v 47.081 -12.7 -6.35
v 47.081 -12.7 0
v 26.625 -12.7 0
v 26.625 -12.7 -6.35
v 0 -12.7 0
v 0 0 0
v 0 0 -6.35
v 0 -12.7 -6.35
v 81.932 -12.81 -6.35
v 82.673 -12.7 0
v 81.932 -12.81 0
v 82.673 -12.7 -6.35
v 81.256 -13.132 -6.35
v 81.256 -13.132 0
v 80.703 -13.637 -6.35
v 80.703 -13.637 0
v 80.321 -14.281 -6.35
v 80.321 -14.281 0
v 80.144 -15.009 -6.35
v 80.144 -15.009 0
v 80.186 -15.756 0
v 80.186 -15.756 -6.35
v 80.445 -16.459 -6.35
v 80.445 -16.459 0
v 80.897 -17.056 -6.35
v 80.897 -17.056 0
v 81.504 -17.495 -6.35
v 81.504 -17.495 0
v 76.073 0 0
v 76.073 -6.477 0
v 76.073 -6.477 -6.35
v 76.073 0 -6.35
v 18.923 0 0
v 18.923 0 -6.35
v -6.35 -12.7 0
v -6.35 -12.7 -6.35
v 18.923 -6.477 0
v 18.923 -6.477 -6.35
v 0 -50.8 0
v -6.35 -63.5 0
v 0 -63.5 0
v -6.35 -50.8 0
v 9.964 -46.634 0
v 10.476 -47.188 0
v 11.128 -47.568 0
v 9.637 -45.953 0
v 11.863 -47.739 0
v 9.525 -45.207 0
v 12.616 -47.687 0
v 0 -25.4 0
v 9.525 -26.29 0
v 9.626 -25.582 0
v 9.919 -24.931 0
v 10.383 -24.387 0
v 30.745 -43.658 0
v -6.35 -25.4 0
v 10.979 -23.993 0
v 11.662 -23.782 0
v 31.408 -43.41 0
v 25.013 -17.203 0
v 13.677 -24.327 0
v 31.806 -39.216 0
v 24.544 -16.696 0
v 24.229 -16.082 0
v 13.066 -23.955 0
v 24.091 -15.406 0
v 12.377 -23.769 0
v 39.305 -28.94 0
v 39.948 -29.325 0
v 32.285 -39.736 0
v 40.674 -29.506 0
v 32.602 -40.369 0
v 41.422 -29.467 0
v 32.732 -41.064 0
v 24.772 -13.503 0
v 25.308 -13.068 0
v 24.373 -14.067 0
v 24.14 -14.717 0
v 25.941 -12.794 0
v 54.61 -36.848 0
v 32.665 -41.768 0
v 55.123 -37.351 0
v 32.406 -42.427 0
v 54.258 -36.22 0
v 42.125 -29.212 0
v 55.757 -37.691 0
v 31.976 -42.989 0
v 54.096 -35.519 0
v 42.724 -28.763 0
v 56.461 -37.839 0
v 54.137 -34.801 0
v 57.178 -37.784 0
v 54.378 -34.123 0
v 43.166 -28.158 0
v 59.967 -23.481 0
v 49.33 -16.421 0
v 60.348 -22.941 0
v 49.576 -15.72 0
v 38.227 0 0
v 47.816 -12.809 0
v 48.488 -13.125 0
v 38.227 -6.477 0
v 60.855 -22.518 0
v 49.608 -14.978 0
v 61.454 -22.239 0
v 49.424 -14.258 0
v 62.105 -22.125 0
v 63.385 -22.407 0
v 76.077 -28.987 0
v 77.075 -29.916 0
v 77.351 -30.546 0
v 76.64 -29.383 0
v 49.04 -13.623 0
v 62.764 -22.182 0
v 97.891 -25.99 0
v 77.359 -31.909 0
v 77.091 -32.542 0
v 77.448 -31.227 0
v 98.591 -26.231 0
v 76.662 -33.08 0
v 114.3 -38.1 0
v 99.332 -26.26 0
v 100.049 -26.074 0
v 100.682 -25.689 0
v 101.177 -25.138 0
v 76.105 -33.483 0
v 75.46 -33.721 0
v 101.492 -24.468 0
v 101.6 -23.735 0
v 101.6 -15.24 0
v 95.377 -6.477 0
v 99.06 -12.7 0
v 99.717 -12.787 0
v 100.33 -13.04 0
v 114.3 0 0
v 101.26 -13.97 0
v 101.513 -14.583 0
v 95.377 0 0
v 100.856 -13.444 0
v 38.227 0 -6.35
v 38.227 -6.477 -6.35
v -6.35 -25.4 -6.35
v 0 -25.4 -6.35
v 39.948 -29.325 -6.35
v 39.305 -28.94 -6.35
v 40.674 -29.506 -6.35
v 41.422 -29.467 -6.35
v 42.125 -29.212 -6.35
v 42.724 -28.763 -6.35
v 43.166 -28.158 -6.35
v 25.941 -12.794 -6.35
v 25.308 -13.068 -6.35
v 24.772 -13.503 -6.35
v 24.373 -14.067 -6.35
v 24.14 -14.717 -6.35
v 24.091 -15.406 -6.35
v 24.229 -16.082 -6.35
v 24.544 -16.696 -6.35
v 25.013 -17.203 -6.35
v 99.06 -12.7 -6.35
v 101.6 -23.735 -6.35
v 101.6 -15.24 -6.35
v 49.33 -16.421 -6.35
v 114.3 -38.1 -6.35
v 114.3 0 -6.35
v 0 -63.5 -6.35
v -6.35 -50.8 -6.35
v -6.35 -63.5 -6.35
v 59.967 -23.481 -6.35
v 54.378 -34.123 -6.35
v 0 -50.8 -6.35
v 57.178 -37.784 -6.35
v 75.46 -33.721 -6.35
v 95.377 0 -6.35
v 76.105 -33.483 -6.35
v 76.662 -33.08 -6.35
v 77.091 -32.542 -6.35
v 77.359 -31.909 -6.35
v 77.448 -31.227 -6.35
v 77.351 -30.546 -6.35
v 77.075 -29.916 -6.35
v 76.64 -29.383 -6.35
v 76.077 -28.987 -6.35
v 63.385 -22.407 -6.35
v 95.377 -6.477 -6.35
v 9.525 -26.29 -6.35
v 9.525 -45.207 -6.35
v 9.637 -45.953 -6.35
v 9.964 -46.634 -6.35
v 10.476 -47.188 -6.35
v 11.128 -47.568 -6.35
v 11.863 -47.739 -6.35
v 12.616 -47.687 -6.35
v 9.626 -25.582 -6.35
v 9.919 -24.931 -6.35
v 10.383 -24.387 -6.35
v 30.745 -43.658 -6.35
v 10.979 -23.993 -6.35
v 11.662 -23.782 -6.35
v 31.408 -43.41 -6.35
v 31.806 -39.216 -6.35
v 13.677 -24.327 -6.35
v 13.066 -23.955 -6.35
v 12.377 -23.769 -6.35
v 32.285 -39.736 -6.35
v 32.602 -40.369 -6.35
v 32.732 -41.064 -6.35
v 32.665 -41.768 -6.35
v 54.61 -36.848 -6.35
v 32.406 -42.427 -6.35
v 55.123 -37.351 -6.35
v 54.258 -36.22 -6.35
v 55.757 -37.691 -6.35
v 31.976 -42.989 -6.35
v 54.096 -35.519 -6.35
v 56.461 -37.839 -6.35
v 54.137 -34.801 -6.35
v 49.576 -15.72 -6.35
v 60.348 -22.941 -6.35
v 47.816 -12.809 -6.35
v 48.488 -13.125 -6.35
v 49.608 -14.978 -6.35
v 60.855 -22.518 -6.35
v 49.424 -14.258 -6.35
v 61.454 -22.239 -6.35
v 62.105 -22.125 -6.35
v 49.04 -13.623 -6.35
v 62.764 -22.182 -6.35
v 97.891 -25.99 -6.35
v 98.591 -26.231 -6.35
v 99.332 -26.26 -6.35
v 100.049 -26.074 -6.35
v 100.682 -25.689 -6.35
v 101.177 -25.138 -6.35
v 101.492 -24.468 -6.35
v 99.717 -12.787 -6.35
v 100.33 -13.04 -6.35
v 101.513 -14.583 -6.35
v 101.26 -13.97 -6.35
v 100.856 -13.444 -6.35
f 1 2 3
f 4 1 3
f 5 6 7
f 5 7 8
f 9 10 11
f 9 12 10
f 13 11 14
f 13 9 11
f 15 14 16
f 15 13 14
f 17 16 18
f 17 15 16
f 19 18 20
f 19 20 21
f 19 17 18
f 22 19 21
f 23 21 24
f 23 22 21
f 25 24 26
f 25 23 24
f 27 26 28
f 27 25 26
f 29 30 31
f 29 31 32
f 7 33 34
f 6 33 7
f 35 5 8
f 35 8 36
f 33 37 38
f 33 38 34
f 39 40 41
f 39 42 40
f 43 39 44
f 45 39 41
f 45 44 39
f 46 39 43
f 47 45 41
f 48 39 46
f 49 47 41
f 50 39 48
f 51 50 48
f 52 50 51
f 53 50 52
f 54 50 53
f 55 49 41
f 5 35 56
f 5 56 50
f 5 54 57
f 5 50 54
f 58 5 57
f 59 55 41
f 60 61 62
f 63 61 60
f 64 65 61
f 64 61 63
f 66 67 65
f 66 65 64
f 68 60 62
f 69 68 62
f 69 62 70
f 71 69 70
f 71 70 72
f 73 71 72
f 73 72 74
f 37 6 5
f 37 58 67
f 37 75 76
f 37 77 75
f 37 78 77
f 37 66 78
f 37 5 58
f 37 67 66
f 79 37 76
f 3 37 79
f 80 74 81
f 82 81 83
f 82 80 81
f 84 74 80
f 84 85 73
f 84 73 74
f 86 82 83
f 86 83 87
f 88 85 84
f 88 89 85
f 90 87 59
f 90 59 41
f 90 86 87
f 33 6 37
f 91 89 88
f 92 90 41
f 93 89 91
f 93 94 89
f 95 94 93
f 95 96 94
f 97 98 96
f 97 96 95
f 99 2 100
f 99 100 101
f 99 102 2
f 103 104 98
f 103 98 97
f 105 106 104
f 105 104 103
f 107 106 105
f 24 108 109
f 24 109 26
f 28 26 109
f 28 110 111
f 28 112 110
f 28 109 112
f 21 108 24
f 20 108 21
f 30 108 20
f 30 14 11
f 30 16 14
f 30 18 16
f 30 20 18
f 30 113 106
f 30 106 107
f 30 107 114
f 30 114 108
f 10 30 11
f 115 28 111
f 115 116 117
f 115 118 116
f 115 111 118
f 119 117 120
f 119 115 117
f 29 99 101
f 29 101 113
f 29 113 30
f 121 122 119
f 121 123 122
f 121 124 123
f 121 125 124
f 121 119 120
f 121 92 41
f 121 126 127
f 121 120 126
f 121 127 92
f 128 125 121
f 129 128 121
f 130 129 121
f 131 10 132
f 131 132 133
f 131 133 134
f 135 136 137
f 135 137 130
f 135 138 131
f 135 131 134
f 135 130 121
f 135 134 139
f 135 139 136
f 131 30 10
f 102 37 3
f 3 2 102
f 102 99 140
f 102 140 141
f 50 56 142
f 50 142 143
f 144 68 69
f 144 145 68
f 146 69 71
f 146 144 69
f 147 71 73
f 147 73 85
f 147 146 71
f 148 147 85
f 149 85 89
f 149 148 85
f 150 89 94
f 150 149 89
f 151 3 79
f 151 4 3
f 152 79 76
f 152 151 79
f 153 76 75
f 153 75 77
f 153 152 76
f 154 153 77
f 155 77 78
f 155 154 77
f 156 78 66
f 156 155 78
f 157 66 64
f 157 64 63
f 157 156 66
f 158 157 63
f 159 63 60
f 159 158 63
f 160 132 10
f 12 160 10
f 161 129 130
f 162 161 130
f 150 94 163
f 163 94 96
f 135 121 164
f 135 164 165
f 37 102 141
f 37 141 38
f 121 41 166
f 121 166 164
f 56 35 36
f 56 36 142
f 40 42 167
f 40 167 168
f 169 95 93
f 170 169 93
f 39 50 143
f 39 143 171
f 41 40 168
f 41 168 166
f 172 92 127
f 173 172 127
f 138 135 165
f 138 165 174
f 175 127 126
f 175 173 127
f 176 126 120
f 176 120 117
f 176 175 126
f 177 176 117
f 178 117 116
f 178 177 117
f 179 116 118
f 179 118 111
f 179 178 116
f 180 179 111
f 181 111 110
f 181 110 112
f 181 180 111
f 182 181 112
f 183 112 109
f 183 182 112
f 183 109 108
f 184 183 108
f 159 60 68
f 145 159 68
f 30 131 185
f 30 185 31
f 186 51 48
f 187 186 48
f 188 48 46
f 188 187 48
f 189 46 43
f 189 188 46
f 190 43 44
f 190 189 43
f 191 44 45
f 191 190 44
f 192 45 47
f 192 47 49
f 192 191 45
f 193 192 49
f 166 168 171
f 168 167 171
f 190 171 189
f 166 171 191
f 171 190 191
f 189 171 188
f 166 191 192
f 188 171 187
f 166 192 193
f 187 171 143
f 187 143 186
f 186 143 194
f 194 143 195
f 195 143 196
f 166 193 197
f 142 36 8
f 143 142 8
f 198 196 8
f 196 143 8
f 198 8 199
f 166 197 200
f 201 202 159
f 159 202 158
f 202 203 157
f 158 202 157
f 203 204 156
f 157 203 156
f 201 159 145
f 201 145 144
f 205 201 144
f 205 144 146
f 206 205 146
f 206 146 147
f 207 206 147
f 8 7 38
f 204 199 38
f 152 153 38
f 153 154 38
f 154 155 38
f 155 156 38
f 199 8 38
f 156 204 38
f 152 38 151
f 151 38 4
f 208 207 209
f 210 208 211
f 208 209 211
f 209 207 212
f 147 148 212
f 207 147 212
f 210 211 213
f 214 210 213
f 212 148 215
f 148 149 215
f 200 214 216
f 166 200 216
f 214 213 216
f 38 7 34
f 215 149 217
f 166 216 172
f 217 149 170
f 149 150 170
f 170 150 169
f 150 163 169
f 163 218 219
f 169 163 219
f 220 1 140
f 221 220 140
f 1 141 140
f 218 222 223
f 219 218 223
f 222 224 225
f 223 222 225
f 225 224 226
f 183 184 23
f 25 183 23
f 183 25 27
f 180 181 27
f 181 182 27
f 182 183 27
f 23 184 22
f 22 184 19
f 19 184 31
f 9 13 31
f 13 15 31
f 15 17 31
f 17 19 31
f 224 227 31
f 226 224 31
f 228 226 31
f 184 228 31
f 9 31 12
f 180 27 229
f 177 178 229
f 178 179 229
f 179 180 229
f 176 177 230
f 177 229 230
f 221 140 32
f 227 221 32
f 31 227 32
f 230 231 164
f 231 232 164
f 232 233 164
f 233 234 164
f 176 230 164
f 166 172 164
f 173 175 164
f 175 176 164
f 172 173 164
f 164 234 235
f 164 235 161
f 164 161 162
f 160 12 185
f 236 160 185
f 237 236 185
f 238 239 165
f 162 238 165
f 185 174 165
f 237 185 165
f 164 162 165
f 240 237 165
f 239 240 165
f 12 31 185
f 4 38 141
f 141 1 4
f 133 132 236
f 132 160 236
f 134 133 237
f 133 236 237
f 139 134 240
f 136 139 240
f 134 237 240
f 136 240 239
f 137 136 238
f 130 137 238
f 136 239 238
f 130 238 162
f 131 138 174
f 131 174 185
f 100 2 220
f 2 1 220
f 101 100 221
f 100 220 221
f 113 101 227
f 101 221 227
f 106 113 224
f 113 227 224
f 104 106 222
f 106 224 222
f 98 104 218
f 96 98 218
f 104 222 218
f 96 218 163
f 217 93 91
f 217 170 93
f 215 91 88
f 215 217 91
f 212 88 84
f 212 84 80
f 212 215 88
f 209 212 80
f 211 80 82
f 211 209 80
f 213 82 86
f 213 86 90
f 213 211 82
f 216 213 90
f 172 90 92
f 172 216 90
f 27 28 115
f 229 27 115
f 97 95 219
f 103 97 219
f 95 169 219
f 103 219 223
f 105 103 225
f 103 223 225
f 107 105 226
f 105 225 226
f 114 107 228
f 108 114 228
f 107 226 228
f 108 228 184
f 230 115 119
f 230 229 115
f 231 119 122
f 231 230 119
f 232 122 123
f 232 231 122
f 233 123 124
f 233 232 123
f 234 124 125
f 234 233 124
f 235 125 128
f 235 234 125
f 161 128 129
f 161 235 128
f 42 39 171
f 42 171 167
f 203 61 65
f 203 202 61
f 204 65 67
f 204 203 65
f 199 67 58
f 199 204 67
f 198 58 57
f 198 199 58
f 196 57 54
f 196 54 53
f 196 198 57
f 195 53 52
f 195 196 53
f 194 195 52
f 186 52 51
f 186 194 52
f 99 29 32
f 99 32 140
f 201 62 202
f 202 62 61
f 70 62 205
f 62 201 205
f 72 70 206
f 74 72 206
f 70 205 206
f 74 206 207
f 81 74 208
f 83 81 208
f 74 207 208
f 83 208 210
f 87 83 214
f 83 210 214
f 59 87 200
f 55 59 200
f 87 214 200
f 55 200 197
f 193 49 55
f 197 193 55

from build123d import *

# Parameters (mm, degrees)
BOSS_EXTRUDE1_DEPTH = 6.35
CUT_EXTRUDE1_DEPTH  = 6.35
FILLET1_R           = 2.54


with BuildPart() as part:
    # Sketch2 → Boss-Extrude1 (new body)
    with BuildSketch(Plane.XY):
        Polygon((-6.35, -63.5), (0, -63.5), (114.3, -38.1), (114.3, 0), (95.377, 0), (95.377, -6.477), (76.073, -6.477), (76.073, 0), (38.227, 0), (38.227, -6.477), (18.923, -6.477), (18.923, 0), (0, 0), (0, -12.7), (-6.35, -12.7), (-6.35, -25.4), (0, -25.4), (0, -50.8), (-6.35, -50.8), align=None)
    extrude(amount=-BOSS_EXTRUDE1_DEPTH)

    # Sketch3 → Cut-Extrude1 (cut)
    with BuildSketch(Plane.XY):
        Polygon((35.837567759, -42.526294431), (9.525, -20.916959432), (9.525, -48.37353171), align=None)
        Polygon((51.284246094, -12.7), (19.530365822, -12.7), (41.715916793, -30.920000703), align=None)
        Polygon((61.141826863, -21.244462208), (51.832146694, -38.971943556), (82.284813735, -32.204684214), align=None)
        Polygon((101.6, -12.7), (72.25424324, -12.7), (101.6, -27.912420599), align=None)
    extrude(amount=-CUT_EXTRUDE1_DEPTH, mode=Mode.SUBTRACT)

    # Fillet1
    fillet1_edges = [part.edges().sort_by_distance(p)[0] for p in [
        (41.715916793, -30.920000703, -3.175),
        (19.530365822, -12.7, -3.175),
        (51.284246094, -12.7, -3.175),
        (61.141826863, -21.244462208, -3.175),
        (82.284813735, -32.204684214, -3.175),
        (51.832146694, -38.971943556, -3.175),
        (72.25424324, -12.7, -3.175),
        (101.6, -12.7, -3.175),
        (101.6, -27.912420599, -3.175),
        (9.525, -20.916959432, -3.175),
        (35.837567759, -42.526294431, -3.175),
        (9.525, -48.37353171, -3.175),
    ]]
    fillet(fillet1_edges, radius=FILLET1_R)


solid = part.part
